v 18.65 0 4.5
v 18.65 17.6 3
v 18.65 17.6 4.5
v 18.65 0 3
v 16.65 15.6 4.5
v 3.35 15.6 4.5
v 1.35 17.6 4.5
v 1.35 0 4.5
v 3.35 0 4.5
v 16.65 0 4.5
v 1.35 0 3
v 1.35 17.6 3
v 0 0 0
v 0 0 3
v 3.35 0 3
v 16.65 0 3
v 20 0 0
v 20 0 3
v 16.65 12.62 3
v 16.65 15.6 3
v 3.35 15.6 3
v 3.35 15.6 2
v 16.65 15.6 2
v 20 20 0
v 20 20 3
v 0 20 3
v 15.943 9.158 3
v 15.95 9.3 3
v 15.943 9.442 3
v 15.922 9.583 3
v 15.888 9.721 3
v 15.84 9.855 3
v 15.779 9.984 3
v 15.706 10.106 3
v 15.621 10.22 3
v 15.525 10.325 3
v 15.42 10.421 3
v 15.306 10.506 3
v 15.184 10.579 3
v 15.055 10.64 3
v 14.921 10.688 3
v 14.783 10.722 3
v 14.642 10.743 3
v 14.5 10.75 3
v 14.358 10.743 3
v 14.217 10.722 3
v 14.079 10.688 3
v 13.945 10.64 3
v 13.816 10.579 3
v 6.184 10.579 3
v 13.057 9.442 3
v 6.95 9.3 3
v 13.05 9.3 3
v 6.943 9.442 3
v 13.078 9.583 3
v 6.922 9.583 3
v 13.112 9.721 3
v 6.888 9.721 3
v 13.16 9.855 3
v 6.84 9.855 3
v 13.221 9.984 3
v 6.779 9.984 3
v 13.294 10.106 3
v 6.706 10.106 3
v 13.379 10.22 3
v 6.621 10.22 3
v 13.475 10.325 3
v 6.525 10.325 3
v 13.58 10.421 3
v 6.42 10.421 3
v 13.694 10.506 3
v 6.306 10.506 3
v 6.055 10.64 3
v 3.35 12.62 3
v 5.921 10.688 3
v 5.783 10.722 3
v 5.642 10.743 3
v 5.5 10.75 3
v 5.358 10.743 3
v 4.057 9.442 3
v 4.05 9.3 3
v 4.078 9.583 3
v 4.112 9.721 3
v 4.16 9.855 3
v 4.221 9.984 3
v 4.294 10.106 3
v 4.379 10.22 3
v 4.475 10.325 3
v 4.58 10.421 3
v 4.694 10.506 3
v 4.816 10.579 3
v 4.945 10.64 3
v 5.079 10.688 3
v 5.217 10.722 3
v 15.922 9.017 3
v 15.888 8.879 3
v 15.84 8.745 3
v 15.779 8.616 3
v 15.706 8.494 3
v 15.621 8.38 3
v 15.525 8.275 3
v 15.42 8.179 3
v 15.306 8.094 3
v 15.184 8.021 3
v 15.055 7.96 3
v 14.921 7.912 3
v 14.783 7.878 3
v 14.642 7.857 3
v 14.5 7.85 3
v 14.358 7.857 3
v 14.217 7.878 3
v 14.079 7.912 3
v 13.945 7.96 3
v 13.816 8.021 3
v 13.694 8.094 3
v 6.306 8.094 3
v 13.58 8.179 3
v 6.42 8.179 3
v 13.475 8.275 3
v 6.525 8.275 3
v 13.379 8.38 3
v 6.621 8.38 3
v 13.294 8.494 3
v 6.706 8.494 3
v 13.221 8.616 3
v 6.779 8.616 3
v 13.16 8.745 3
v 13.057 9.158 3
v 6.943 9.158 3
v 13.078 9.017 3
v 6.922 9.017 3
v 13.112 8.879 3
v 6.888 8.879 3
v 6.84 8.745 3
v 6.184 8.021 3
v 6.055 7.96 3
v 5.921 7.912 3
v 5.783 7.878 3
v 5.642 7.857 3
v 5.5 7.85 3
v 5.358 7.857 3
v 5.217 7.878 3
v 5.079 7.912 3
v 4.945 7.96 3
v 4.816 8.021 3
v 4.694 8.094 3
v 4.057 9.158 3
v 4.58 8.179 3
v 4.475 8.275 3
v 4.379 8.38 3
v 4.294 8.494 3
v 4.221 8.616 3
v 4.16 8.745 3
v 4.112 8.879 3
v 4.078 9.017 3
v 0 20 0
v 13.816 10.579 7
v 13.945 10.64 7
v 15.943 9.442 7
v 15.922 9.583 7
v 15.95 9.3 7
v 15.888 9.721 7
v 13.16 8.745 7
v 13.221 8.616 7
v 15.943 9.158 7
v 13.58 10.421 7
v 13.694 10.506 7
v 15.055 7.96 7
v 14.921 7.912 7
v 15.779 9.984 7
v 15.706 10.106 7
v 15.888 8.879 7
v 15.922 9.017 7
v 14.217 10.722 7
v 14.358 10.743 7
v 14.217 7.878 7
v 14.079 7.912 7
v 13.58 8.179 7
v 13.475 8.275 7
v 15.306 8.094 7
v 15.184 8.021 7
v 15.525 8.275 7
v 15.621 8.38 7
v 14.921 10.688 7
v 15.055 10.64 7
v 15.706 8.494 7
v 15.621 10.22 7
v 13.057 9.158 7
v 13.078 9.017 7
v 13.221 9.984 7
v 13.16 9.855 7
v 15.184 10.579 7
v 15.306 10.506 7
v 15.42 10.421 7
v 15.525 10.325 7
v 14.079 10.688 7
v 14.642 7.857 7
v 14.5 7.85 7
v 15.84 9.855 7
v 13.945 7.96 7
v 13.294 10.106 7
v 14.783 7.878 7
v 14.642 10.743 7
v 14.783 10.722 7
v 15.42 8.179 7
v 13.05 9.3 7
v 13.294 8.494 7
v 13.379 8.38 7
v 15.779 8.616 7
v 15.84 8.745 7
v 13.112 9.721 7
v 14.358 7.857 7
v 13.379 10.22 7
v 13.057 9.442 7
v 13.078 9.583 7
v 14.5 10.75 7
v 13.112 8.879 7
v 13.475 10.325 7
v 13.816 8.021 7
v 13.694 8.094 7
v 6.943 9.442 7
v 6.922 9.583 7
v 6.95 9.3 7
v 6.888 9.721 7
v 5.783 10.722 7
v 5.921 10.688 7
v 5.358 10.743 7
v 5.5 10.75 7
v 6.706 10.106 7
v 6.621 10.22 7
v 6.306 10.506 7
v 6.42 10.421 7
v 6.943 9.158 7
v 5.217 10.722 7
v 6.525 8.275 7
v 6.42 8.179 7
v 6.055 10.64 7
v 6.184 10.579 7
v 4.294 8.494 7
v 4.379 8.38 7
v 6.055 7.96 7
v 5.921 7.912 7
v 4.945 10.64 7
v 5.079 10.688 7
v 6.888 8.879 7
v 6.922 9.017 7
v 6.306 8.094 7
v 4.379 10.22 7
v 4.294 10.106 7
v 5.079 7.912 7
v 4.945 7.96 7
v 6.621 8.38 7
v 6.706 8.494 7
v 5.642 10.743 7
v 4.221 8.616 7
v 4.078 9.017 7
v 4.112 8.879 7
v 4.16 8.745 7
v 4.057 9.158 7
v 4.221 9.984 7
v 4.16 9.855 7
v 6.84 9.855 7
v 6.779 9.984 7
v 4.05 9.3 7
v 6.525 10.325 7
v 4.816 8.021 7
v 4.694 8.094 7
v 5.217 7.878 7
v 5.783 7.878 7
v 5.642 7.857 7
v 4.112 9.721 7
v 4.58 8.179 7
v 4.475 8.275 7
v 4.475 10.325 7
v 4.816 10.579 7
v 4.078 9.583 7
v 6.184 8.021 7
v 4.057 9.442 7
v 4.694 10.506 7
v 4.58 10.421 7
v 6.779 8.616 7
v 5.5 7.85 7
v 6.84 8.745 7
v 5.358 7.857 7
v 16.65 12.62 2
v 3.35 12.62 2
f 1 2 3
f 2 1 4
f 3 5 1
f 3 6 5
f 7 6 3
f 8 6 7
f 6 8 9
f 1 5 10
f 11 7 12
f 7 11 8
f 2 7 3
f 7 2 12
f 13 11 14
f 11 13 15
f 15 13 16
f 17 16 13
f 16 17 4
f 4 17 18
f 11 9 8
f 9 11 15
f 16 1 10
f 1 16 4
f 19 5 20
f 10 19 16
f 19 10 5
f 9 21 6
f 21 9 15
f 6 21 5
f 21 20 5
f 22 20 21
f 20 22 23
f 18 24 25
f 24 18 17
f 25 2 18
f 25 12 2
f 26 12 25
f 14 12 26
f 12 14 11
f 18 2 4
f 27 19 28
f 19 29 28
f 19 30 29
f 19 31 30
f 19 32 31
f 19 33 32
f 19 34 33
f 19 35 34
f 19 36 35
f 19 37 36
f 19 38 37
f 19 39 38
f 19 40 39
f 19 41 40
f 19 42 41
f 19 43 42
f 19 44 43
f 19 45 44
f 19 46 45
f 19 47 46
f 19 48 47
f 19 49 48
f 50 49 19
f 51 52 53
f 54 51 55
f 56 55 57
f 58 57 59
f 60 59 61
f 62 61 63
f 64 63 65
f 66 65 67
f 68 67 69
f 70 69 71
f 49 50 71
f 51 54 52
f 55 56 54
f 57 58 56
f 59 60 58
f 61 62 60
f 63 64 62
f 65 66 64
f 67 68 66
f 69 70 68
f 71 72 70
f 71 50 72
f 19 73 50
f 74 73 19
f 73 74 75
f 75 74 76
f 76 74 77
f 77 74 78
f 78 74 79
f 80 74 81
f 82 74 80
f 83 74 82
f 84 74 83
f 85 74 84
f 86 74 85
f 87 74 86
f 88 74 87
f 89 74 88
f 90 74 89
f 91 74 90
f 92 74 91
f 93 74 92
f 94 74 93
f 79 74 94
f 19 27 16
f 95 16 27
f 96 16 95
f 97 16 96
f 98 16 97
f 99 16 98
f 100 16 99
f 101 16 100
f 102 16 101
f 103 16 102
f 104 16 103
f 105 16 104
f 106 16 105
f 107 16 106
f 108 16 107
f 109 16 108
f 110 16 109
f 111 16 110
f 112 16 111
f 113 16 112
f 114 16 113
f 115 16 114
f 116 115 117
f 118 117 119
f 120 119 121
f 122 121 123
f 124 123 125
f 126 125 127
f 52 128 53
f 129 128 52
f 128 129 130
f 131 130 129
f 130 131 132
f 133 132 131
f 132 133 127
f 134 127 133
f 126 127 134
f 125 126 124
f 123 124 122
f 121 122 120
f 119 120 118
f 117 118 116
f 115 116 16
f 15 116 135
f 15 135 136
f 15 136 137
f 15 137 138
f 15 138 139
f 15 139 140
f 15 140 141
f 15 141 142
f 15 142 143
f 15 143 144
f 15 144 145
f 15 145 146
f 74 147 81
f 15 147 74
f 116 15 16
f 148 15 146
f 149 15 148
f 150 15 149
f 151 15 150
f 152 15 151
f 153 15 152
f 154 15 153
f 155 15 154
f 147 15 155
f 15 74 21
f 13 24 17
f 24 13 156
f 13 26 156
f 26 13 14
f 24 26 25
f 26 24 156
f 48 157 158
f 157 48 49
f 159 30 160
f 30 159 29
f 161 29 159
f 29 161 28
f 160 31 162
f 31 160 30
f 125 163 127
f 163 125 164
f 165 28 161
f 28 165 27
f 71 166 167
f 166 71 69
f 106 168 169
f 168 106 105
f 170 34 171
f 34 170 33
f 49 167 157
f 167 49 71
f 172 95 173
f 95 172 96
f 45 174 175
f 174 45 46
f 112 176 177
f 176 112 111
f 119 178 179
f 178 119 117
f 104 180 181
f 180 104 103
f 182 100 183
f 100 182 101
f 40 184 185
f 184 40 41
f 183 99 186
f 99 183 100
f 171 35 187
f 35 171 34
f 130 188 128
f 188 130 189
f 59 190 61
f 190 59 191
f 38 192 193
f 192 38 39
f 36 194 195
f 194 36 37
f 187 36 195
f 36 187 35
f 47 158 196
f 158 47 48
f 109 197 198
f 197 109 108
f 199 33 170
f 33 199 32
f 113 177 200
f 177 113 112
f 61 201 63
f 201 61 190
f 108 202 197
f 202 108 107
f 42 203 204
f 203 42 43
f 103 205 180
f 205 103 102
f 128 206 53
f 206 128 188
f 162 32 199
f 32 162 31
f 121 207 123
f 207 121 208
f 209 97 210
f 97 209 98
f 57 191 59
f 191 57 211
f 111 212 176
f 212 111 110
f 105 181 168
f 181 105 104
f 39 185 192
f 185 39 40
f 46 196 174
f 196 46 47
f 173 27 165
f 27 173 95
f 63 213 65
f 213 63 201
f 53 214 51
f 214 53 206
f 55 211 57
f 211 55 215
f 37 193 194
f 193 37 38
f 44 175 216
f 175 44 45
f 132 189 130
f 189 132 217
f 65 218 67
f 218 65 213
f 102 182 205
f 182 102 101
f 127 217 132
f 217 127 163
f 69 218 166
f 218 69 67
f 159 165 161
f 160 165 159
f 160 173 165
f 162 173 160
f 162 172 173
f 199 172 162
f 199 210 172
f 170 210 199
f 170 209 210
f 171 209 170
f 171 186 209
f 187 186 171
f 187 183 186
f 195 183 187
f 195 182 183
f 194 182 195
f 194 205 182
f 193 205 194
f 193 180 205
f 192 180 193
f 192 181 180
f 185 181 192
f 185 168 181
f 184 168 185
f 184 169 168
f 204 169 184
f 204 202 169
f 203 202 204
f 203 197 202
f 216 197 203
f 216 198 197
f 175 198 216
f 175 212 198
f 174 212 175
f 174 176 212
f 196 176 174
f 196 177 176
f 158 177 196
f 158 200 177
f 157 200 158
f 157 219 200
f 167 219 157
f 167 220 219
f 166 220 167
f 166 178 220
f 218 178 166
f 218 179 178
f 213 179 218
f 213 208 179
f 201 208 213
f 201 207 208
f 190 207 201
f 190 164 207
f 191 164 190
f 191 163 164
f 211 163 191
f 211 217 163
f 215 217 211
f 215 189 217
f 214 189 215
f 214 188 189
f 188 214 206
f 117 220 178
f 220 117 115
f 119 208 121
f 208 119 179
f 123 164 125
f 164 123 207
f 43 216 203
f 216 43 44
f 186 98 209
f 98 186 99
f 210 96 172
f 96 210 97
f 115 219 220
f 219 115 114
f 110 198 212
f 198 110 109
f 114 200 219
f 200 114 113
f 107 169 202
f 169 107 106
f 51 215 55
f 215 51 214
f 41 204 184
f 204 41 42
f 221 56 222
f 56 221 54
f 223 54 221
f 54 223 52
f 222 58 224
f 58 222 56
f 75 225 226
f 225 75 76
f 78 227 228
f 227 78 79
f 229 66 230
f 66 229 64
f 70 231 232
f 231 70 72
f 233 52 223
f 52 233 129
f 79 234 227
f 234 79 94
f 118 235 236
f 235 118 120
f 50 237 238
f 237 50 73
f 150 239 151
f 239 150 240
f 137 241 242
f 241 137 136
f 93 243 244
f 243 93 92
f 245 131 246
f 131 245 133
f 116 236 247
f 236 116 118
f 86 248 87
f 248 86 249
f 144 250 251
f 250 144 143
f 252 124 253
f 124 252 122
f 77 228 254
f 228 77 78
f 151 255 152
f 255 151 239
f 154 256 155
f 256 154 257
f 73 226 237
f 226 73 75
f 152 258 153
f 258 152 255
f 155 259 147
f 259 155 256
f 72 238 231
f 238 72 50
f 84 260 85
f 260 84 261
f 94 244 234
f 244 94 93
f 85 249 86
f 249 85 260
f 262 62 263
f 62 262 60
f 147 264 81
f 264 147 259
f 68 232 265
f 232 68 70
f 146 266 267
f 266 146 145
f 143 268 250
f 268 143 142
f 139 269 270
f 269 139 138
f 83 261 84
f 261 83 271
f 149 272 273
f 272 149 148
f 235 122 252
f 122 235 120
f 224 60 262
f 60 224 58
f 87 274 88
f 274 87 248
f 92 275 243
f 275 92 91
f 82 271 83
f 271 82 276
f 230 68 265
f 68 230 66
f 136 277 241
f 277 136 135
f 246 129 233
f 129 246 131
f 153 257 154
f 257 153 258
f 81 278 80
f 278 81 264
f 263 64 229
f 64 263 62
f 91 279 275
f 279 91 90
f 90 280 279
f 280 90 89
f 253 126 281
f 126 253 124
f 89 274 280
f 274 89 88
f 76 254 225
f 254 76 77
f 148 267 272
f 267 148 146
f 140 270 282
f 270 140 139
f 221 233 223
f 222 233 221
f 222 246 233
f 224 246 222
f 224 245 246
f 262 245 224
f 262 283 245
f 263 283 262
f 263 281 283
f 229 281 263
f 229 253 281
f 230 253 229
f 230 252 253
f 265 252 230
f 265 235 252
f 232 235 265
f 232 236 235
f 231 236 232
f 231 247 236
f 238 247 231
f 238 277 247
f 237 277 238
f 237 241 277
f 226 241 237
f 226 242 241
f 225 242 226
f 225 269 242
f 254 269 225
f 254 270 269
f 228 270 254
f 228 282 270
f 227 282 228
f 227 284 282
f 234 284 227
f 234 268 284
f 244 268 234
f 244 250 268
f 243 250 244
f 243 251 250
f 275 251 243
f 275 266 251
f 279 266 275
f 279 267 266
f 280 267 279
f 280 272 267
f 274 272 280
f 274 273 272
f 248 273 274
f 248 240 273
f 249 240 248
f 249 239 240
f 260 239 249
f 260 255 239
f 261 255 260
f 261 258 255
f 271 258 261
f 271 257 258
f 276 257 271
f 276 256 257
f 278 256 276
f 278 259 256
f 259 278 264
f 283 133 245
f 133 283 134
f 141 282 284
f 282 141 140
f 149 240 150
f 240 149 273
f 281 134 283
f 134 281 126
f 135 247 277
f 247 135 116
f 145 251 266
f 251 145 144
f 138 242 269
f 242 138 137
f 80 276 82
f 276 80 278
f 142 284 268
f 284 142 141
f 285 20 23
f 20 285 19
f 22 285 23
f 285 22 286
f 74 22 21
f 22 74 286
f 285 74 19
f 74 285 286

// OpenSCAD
$fn = 64;

/**
 * A component to hold a micro USB breakout.
 *
 * @param width        width of the component surface (x-axis)
 * @param length       length of the component surface (y-axis)
 * @param height       height of the component surface (z-axis)
 * @param surround     boolean indicating whether surrounding walls should be rendered
 */
module micro_usb(width, length, height, surround = true) {
  translate([width / 2, length / 2, height / 2]) {
    peg_height = 4.0;
    peg_radius = 1.45;

    recess_width = 13.3;
    recess_length = 2.98;
    recess_height = 1.0;

    surround_height = 3.0;
    surround_width = 2.0;

    difference() {
      union() {
        // surface
        cube([width, length, height], true);
        
        // pegs
        translate([4.5, (-length / 2) + 9.3, height/2])
          cylinder(h = peg_height, r = peg_radius, center = false);
        // pegs
        translate([-4.5, (-length / 2) + 9.3, height/2])
          cylinder(h = peg_height, r = peg_radius, center = false);
        
        if (surround) {
          translate([(13.3 + (surround_width * 2)) / -2, (-length / 2), 0]) {
            difference() {
              cube([13.3 + (surround_width * 2), 15.6 + surround_width, surround_height]);
              translate([surround_width, 0, 0])
                cube([13.3, 15.6, surround_height]);
            }
          }
        }
      }
      
      // recess
      translate([-recess_width / 2, (-length / 2) + 14.11 - (recess_length / 2), (height / 2) - recess_height])
        cube([recess_width, recess_length, 1]);
    }
  }
}

// Test the component
rows = 1;
columns = 1;

component_length = 20;
component_width = 20;
panel_thickness = 3;

for (i = [0:columns - 1]) {
  for (j = [0:rows - 1]) {
    translate([component_width * i, component_length * j, 0])
      micro_usb(component_width, component_length, panel_thickness);
  }
}
